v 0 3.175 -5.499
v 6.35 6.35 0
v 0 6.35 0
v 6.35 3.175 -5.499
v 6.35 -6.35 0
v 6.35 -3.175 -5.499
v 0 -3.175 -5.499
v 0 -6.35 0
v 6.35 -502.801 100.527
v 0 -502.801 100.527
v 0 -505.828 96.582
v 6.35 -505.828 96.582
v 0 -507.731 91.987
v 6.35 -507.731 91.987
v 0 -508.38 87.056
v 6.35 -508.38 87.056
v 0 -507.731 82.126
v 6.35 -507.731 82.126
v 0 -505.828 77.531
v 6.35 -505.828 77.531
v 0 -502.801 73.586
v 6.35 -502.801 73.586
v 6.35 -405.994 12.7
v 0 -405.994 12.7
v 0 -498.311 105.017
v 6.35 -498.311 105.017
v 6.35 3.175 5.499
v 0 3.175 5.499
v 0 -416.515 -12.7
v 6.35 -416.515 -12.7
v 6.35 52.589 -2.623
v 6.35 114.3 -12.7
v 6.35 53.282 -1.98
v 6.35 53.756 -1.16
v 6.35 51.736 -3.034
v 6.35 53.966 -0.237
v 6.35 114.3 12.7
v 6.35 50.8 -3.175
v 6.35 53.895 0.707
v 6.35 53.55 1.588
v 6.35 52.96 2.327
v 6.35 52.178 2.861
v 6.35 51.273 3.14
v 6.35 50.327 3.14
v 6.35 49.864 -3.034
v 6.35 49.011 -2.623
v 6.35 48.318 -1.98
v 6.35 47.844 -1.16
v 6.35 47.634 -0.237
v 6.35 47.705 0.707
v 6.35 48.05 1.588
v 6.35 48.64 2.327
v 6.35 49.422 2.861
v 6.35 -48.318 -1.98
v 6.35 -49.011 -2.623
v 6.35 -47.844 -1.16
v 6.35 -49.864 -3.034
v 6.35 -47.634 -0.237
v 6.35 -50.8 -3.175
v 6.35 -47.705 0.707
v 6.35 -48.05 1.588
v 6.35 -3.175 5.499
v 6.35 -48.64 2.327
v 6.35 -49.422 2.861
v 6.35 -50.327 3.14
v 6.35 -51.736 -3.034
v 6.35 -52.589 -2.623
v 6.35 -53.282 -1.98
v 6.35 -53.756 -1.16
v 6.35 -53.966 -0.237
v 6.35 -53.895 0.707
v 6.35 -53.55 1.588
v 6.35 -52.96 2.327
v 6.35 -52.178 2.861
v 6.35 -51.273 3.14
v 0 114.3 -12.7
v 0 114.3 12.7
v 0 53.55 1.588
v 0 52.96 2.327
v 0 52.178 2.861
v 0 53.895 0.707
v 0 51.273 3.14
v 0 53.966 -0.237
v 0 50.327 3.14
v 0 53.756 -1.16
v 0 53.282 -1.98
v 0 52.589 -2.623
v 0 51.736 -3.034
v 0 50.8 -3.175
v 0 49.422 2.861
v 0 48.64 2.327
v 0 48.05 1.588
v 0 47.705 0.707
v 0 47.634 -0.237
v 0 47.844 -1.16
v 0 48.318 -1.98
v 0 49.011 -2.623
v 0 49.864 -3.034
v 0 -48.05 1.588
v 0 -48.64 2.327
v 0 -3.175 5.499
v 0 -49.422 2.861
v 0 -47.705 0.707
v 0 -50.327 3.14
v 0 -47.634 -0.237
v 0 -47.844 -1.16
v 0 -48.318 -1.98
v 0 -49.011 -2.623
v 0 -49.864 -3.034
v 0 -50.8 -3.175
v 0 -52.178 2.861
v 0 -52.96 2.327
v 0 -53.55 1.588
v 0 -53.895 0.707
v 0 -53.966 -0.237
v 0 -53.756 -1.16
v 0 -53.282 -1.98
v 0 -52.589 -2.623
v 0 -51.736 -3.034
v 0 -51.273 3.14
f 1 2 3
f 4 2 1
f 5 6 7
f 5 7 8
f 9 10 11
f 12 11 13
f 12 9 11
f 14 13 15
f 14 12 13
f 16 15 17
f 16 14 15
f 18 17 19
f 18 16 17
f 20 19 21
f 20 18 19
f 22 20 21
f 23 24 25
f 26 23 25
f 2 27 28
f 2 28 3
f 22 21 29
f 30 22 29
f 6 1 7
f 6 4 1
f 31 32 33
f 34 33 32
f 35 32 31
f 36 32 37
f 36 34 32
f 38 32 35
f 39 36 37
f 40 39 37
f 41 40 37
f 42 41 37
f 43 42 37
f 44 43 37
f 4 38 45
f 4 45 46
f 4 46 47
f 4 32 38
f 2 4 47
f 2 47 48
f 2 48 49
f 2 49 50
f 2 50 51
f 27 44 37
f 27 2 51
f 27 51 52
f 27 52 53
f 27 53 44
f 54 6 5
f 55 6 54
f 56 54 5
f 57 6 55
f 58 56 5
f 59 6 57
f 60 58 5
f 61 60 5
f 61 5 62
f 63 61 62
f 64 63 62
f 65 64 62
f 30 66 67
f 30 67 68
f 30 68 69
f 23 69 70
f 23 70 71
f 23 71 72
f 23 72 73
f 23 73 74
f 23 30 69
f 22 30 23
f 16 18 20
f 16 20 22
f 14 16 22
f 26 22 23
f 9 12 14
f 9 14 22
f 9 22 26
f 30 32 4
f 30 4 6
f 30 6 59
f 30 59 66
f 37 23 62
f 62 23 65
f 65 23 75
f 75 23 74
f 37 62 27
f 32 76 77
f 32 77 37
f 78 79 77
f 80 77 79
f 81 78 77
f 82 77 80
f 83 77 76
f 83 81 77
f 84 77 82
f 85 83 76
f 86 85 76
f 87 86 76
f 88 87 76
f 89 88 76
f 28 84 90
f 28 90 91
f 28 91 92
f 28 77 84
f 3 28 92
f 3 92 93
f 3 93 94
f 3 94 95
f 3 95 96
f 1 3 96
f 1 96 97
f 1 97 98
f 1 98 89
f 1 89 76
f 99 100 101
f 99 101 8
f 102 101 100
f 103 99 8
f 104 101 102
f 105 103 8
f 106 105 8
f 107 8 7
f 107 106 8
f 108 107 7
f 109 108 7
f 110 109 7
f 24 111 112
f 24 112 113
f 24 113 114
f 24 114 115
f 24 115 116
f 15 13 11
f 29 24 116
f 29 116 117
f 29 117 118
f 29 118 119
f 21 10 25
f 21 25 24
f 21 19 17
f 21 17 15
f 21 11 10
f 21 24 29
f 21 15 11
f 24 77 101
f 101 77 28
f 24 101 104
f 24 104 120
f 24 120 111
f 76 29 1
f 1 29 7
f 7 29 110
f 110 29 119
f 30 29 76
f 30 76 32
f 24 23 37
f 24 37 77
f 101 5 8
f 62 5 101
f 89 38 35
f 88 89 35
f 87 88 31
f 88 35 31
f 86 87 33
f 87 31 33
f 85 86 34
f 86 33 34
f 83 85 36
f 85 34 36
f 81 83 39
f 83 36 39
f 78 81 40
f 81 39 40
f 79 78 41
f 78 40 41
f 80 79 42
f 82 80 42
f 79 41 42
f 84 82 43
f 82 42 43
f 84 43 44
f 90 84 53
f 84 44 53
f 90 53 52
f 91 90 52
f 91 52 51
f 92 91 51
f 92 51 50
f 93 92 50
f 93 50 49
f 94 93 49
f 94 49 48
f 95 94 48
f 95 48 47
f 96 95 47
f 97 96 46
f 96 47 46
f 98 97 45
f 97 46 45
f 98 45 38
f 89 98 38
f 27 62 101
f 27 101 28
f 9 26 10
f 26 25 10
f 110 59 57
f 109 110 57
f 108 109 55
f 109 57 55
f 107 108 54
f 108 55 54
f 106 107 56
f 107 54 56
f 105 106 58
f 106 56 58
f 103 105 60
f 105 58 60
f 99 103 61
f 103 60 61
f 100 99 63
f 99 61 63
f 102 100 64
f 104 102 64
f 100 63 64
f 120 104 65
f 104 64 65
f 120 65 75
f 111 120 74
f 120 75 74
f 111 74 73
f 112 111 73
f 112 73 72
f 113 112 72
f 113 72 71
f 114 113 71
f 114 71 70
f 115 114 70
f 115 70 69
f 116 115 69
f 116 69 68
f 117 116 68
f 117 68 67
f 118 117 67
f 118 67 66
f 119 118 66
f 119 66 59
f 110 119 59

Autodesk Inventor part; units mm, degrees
ref_plane "YZ Plane" through (0, 0, 0) normal (1, 0, 0) x (0, 1, 0)
ref_plane "XZ Plane" through (0, 0, 0) normal (0, 1, 0) x (-1, 0, 0)
ref_plane "XY Plane" through (0, 0, 0) normal (0, 0, 1) x (1, 0, 0)
sketch "Sketch1" plane through (0, 0, 0) normal (1, 0, 0) x (0, 1, 0)
  circle A0 centre (0, 0) radius 3.175
  line L0 (0, 0) -> (12.7, 0)
  line L1 (0, 0) -> (12.7, 0) construction
  line L2 (12.7, 0) -> (12.7, -12.7)
  line L3 (12.7, -12.7) -> (-405.9936, -12.7)
  line L4 (-405.9936, -12.7) -> (-405.9936, 12.7)
  line L5 (-405.9936, 12.7) -> (12.7, 12.7)
  line L6 (12.7, 12.7) -> (12.7, -12.7)
  line L7 (-405.9936, 12.7) -> (-498.3106, 105.017)
  line L8 (-405.9936, 12.7) -> (-275.4376, 12.7) construction
  line L9 (-498.3106, 105.017) -> (-516.2711, 87.0565)
  line L10 (-516.2711, 87.0565) -> (-408.5081, -20.7066)
  line L11 (-405.9936, -12.7) -> (-431.3936, -12.7)
  line L12 (-405.9936, -12.7) -> (-380.5936, -12.7) construction
  line L13 (-516.2711, 87.0565) -> (-416.5146, -12.7)
  line L14 (-416.5146, -12.7) -> (12.7, -12.7)
  dimension "d0" = 6.35
  dimension "d1" = 12.7
  dimension "d2" = 0
  dimension "d3" = 12.7
  dimension "d4" = 90
  dimension "d5" = 418.6936
  dimension "d6" = 25.4
  dimension "d7" = 130.556
  dimension "d8" = 135
  dimension "d9" = 25.4
  dimension "d10" = 90
  dimension "d11" = 152.4
  dimension "d12" = 90
  dimension "d13" = 25.4
  dimension "d14" = 180
extrude "Extrusion1" add sketch "Sketch1" along normal blind 25.4
sketch "Sketch2" plane through (25.4, 0, 0) normal (1, 0, 0) x (0, 0, -1)
  line L0 (-105.017, -498.3106) -> (-87.0565, -516.2711) projected
  line L1 (-87.0565, -516.2711) -> (12.7, -416.5146) projected
  line L2 (-12.7, 12.7) -> (-12.7, -405.9936) projected
  line L3 (-96.0368, -507.2909) -> (-78.0763, -507.2909)
  line L4 (-105.017, -498.3106) -> (-100.5269, -502.8008)
  line L5 (-100.5269, -502.8008) -> (-73.5861, -502.8008)
  arc A0 (-100.5269, -502.8008) -> (-73.5861, -502.8008) centre (-87.0565, -489.3304) ccw
  dimension "d17" = 6.35
  dimension "d18" = 19.05
extrude "Extrusion2" cut sketch "Sketch2" against normal blind 25.4 contours A0 L3 L0 | L3 A0 L1 L0 | L1 L3 A0
sketch "Sketch3" plane through (0, 12.7, 12.7) normal (0, 1, 0) x (1, 0, 0)
  line L0 (0, 25.4) -> (0, 0) projected
  line L1 (0, 0) -> (25.4, 0) projected
  line L2 (25.4, 25.4) -> (25.4, 0) projected
  line L3 (0, 25.4) -> (25.4, 25.4) projected
  point P0 (0, 12.7)
extrude "Extrusion3" add sketch "Sketch3" along normal blind 127
sketch "Sketch4" plane through (25.4, 0, 0) normal (1, 0, 0) x (0, 0, -1)
  arc A0 (-100.5269, -502.8008) -> (-73.5861, -502.8008) centre (-87.0565, -489.3304) ccw projected
  line L0 (-73.5861, -502.8008) -> (12.7, -416.5146) projected
  line L1 (12.7, -416.5146) -> (12.7, 139.7) projected
  line L2 (-12.7, 139.7) -> (12.7, 139.7) projected
  line L3 (-12.7, -405.9936) -> (-12.7, 139.7) projected
  line L4 (-12.7, -405.9936) -> (-105.017, -498.3106) projected
  line L5 (-105.017, -498.3106) -> (-100.5269, -502.8008) projected
  circle A1 centre (0, 0) radius 3.175 projected
extrude "Extrusion4" cut sketch "Sketch4" against normal blind 19.05
sketch "Sketch5" plane through (6.35, 0, 0) normal (1, 0, 0) x (0, 0, -1)
  line L0 (-12.7, 139.7) -> (12.7, 139.7)
  line L1 (12.7, 139.7) -> (12.7, 12.7)
  line L2 (12.7, 12.7) -> (-12.7, 12.7)
  line L3 (-12.7, 12.7) -> (-12.7, 139.7)
  dimension "d25" = 25.4
  dimension "d26" = 127
extrude "Extrusion5" cut sketch "Sketch5" against normal blind 127
sketch "Sketch8" plane through (6.35, 12.7, 12.7) normal (0, 1, 0) x (1, 0, 0)
  line L0 (-6.35, 0) -> (-6.35, 25.4) projected
  line L1 (0, 0) -> (-6.35, 0) projected
  line L2 (0, 25.4) -> (0, 0) projected
  line L3 (-6.35, 25.4) -> (0, 25.4) projected
  point P0 (-6.35, 12.7)
extrude "Extrusion8" add sketch "Sketch8" along normal blind 101.6
sketch "Sketch9" plane through (6.35, 0, 0) normal (1, 0, 0) x (0, 0, -1)
  circle A0 centre (0, 0) radius 3.175 projected
  circle A1 centre (0, 0) radius 6.35
  dimension "d45" = 12.7
extrude "Extrusion9" cut sketch "Sketch9" against normal blind 25.4
sketch "Sketch10" plane through (6.35, 0, 0) normal (1, 0, 0) x (0, 0, -1)
  circle A0 centre (0, 0) radius 6.35 projected
  line L0 (0, 6.35) -> (5.4993, 3.175)
  line L1 (5.4993, 3.175) -> (5.4993, -3.175)
  line L2 (5.4993, -3.175) -> (0, -6.35)
  line L3 (0, -6.35) -> (-5.4993, -3.175)
  line L4 (-5.4993, -3.175) -> (-5.4993, 3.175)
  line L5 (-5.4993, 3.175) -> (0, 6.35)
extrude "Extrusion11" add sketch "Sketch10" against normal blind 6.35 contours A0 L1 | L0 A0 | A0 L2 | L5 A0 | A0 L3 | L4 A0
sketch "Sketch11" plane through (6.35, 0, 0) normal (1, 0, 0) x (0, 0, -1)
  line L0 (12.7, 114.3) -> (12.7, -416.5146) projected
  line L1 (-12.7, 114.3) -> (12.7, 114.3) projected
  line L2 (0, 114.3) -> (0, 50.8)
  line L3 (0, 114.3) -> (63.5, 114.3) construction
  line L4 (0, 50.8) -> (0, -50.8)
  line L5 (0, 50.8) -> (101.6, 50.8) construction
  circle A0 centre (0, 50.8) radius 3.175
  circle A1 centre (0, -50.8) radius 3.175
  point P0 (0, 0)
  dimension "d54" = 63.5
  dimension "d55" = 90
  dimension "d56" = 101.6
  dimension "d57" = 90
  dimension "d58" = 6.35
  dimension "d59" = 6.35
extrude "Extrusion12" cut sketch "Sketch11" against normal blind 6.35
properties part number "FlatArm"
